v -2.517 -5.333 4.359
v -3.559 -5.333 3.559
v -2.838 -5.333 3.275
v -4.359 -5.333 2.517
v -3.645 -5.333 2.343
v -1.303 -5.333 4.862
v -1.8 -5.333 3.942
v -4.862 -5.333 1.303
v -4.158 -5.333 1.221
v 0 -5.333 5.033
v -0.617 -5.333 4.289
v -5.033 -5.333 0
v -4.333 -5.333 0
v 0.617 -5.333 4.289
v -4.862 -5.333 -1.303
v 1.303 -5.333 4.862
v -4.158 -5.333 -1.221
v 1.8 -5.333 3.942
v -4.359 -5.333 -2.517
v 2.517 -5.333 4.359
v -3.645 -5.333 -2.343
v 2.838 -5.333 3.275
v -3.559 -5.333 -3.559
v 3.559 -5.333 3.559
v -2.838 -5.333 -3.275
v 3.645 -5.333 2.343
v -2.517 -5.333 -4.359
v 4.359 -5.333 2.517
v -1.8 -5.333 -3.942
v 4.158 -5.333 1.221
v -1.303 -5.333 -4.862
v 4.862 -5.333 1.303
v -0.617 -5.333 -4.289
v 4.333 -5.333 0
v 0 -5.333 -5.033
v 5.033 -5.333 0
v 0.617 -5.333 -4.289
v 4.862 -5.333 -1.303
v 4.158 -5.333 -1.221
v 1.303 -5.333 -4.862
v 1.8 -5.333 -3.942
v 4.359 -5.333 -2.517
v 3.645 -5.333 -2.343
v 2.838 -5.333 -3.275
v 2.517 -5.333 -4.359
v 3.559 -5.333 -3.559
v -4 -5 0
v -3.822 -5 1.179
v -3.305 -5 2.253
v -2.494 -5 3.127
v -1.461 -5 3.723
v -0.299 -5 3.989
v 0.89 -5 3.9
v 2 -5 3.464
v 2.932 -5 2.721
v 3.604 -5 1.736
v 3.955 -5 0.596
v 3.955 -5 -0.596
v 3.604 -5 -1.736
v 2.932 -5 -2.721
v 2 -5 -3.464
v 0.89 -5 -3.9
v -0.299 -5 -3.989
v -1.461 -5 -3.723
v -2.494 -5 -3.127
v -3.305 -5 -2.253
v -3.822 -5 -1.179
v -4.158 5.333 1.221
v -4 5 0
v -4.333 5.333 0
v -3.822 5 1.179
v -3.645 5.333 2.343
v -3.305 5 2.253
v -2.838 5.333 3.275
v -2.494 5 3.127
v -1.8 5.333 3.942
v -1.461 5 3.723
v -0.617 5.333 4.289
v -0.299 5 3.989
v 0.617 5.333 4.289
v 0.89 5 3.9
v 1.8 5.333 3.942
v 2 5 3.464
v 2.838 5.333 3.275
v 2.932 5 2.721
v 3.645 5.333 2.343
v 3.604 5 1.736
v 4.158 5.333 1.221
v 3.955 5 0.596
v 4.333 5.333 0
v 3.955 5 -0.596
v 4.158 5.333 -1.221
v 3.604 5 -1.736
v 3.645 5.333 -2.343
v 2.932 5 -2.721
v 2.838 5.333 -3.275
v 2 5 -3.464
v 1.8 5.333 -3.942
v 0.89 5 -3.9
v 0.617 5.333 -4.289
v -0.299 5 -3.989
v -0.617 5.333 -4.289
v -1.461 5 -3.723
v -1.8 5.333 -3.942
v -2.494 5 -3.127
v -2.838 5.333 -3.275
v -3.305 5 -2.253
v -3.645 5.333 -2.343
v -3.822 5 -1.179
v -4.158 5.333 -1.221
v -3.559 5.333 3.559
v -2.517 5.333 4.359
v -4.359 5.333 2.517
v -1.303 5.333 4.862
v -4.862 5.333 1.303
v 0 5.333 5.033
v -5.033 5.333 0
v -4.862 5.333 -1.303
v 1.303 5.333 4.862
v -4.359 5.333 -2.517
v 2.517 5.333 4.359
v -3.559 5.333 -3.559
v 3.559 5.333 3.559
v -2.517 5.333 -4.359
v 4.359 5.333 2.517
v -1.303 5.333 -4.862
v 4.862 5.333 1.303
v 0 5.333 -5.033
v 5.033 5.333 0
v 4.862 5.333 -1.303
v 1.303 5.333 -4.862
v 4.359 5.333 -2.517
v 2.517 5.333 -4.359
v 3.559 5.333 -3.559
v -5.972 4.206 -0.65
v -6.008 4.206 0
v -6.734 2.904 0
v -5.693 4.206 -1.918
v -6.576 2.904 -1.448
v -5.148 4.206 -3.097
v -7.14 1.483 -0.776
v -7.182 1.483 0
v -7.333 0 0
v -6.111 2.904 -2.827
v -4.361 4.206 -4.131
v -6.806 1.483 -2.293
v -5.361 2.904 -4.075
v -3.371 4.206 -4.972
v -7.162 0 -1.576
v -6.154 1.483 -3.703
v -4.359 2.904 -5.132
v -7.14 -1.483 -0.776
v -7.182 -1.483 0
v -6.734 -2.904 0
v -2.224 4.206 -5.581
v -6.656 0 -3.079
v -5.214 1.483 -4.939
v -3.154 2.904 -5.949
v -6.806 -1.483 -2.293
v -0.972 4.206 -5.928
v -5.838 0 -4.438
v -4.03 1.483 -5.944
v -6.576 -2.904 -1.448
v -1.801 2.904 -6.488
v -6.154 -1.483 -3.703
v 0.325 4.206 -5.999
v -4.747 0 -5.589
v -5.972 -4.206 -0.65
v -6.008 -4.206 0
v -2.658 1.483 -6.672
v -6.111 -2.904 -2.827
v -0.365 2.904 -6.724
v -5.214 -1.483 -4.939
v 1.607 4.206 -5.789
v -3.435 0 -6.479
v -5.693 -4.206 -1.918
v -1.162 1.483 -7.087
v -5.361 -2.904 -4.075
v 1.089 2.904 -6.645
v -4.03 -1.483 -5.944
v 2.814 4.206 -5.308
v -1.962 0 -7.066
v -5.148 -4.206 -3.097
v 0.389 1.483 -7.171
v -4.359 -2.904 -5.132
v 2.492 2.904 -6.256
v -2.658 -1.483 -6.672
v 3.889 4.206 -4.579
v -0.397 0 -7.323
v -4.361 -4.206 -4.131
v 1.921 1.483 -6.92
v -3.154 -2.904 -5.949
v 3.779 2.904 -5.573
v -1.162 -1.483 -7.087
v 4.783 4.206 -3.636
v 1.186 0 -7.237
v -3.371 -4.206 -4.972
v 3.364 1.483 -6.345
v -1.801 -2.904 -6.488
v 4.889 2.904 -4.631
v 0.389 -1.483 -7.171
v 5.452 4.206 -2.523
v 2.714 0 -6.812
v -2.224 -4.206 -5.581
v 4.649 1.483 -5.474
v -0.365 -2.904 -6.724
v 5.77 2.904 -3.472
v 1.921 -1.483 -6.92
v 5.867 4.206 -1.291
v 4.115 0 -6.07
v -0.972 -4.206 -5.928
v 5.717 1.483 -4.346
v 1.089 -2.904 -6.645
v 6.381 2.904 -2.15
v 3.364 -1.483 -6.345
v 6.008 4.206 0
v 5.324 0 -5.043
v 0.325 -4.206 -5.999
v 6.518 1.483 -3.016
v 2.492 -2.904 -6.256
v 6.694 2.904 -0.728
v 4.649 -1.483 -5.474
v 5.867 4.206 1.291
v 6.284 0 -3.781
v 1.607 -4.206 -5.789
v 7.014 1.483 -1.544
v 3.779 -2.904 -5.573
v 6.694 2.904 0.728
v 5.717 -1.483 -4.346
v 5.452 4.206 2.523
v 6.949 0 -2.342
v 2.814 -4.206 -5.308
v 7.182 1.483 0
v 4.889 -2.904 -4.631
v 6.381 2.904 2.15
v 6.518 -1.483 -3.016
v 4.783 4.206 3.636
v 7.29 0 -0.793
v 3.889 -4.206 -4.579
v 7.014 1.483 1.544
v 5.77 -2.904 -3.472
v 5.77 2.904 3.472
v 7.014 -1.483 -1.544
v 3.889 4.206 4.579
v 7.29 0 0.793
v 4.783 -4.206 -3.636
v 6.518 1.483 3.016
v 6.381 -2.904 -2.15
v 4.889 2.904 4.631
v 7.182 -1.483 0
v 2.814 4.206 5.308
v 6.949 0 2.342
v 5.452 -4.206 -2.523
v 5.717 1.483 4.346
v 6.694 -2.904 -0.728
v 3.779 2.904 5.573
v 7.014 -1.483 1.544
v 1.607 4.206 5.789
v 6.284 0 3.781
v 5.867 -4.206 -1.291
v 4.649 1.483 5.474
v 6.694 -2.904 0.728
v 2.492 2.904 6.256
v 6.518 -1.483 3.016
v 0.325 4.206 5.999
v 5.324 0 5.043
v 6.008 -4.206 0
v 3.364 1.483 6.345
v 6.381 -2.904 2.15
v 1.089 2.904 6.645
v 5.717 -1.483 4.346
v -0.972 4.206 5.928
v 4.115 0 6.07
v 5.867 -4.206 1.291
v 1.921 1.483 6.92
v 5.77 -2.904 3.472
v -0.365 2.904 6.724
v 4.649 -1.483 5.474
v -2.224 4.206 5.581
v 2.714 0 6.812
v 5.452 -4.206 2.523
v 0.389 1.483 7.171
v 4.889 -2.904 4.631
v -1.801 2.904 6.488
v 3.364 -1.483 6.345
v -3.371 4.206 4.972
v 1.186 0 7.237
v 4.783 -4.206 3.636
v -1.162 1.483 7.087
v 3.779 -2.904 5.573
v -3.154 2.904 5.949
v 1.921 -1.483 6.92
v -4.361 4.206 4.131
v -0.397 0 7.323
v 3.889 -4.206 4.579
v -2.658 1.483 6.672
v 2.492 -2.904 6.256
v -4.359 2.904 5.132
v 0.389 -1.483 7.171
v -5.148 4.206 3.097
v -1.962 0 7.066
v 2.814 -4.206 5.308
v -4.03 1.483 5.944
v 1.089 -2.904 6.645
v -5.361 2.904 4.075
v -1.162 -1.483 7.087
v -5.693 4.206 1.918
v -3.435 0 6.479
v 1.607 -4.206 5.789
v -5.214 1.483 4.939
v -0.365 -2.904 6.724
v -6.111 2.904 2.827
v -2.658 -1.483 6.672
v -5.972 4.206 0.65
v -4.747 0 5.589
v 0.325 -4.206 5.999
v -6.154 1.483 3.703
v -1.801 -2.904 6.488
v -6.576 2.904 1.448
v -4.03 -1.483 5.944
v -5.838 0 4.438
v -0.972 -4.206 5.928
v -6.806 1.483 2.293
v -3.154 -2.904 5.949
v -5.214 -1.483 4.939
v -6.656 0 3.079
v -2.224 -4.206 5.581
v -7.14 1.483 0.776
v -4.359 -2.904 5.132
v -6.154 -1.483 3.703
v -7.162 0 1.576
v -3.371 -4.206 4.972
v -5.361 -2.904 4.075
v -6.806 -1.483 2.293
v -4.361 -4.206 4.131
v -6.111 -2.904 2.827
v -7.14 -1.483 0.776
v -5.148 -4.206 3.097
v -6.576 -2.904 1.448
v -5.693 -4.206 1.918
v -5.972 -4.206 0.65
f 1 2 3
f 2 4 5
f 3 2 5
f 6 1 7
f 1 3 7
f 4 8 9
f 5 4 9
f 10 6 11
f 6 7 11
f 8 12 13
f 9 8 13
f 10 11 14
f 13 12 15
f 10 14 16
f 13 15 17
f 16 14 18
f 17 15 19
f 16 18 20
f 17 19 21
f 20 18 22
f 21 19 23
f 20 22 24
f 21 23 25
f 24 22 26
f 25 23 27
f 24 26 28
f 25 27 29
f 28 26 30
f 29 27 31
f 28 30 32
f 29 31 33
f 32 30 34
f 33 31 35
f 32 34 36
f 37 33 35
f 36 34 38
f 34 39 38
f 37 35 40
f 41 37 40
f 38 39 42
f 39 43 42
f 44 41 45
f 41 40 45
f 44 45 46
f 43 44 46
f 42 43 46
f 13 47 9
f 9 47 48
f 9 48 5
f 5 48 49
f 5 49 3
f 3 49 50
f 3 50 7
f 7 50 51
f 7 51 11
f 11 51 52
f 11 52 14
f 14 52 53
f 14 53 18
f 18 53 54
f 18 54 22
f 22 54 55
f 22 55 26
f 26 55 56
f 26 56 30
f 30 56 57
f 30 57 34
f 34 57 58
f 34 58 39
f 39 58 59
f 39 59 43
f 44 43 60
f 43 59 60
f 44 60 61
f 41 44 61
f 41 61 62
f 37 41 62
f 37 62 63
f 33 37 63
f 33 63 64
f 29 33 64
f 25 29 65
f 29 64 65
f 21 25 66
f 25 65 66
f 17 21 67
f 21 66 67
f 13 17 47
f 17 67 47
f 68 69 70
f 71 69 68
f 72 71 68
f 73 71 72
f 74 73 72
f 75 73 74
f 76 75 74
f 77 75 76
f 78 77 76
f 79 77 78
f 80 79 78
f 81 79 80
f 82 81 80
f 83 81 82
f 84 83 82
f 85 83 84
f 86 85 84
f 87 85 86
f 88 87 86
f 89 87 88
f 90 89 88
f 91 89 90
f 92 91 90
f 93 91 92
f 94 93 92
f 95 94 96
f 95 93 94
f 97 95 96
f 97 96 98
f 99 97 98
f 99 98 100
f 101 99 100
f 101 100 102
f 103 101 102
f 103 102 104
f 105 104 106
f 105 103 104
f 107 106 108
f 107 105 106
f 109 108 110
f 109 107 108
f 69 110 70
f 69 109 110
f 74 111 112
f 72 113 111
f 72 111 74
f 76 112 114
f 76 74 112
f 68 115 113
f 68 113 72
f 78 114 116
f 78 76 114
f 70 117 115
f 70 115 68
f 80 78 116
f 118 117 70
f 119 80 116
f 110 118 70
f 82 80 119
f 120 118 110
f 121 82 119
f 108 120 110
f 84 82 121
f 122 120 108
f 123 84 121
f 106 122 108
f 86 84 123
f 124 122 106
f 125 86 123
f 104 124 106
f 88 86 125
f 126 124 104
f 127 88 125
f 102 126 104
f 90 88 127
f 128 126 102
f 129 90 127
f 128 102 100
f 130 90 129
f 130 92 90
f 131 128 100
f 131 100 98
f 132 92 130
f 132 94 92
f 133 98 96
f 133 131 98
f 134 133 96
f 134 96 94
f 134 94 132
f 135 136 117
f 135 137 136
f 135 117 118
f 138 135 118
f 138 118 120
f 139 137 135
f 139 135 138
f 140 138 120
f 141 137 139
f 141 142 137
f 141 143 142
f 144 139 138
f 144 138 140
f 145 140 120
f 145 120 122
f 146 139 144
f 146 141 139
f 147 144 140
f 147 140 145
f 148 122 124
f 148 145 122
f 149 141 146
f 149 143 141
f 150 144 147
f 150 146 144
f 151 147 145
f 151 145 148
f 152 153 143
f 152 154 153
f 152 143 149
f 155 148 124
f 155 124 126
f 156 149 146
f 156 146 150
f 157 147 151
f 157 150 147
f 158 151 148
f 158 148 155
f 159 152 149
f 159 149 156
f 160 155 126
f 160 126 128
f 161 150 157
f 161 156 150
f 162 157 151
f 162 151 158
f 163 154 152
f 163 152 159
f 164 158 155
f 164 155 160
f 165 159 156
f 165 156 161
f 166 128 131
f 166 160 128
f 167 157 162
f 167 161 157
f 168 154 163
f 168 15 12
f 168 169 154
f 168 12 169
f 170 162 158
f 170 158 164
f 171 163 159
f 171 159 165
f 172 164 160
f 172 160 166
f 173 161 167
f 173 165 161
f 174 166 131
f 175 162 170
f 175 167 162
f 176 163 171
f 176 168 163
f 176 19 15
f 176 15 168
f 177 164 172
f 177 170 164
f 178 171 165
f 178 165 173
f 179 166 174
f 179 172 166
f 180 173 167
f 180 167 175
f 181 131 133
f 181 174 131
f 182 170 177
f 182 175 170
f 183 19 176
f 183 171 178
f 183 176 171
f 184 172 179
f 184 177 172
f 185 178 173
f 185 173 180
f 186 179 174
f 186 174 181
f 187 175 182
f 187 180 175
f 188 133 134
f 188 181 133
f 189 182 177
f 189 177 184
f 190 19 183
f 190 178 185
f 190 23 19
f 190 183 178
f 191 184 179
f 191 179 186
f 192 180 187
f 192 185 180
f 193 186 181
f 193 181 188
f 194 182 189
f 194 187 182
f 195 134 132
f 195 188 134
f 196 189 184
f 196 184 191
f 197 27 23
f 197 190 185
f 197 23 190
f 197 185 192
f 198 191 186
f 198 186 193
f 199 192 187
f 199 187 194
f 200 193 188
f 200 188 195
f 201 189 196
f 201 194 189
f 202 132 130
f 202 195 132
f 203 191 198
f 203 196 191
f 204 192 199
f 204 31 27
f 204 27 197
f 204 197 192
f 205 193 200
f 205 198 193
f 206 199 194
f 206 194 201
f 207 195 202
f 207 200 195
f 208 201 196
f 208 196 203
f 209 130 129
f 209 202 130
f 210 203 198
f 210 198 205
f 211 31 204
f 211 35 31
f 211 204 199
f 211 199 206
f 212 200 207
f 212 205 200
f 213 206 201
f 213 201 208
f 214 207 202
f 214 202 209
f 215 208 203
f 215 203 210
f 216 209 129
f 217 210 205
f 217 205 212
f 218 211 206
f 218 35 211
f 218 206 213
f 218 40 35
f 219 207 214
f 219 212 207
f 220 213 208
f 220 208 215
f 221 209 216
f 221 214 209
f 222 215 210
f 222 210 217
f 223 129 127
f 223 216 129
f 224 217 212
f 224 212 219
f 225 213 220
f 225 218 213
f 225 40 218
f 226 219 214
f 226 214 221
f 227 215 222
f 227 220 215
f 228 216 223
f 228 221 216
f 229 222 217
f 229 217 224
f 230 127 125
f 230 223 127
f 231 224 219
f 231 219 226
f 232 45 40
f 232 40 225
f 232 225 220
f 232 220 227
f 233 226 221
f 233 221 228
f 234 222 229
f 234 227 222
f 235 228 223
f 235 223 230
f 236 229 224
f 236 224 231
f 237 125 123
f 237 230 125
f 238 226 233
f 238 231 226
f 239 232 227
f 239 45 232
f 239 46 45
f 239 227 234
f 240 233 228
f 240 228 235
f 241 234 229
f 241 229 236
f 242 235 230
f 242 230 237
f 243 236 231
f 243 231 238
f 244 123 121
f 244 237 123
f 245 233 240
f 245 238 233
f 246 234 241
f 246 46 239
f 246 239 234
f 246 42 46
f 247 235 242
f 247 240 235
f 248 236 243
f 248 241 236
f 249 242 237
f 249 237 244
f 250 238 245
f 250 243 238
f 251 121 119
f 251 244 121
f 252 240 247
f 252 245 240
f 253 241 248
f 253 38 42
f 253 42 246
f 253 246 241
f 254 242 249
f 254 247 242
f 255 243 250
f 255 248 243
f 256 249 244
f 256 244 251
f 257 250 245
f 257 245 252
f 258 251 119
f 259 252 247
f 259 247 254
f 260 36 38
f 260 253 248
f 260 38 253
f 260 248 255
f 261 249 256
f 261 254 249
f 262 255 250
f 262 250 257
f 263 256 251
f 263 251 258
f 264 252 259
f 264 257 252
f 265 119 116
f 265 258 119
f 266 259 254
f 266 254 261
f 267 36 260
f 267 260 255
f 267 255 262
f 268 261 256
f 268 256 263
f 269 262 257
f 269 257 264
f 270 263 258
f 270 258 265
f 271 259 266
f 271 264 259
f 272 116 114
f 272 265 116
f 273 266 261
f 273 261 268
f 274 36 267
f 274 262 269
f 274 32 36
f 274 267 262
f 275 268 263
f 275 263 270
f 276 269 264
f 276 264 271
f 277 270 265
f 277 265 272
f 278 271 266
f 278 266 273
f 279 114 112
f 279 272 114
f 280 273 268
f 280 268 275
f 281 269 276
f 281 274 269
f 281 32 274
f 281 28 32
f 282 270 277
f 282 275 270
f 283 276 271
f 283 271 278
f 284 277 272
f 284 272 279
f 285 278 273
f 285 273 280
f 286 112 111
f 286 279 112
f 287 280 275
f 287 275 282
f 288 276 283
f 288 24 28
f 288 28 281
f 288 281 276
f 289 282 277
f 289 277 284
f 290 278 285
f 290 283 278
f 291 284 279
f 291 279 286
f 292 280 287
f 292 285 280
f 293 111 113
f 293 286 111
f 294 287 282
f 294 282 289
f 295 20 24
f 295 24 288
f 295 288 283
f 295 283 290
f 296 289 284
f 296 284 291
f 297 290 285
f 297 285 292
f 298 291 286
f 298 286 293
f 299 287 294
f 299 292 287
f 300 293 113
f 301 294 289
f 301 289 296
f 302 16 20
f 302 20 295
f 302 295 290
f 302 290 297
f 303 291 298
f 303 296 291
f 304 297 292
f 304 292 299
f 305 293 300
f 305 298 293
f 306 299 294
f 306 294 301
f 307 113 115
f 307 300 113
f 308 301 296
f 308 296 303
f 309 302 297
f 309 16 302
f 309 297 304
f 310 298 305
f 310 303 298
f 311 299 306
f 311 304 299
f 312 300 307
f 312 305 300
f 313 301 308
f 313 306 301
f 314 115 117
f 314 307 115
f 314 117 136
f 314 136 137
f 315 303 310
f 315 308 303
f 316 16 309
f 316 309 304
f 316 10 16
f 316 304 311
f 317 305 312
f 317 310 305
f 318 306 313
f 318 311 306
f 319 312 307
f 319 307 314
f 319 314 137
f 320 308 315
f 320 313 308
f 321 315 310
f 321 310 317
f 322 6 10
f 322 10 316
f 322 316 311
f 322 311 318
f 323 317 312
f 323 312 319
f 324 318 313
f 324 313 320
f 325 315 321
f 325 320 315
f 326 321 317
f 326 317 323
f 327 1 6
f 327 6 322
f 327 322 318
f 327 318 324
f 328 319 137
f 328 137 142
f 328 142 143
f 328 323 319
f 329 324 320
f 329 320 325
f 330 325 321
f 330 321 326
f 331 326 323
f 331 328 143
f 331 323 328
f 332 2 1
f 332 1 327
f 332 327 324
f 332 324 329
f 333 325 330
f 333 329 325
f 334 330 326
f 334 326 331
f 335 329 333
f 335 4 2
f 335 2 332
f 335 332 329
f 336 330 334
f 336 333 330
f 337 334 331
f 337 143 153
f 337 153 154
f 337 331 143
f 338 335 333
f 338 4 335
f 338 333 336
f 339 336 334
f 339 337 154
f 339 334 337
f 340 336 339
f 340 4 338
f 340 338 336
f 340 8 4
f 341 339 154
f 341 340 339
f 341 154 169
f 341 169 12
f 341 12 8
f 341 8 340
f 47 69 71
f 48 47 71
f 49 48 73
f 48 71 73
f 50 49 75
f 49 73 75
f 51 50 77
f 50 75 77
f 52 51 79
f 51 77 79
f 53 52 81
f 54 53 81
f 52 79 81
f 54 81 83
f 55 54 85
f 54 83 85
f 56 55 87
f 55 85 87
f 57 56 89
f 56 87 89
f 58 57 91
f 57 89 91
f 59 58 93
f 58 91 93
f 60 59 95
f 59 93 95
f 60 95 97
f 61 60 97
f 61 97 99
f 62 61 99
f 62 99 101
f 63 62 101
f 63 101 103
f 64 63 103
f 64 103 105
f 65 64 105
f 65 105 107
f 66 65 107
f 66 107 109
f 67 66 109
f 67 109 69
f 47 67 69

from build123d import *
from build123d.topology import SkipClean

# Parameters (mm, degrees)
CUT_EXTRUDE1_START     = -7.549834435
CUT_EXTRUDE1_OUTLINE_W = 18
CUT_EXTRUDE1_OUTLINE_H = 4
CUT_EXTRUDE1_DEPTH     = 15.09966887
SKETCH3_R              = 6
CUT_EXTRUDE2_DEPTH     = 57
CHAMFER1_SIZE          = 0.5
SCALE1_SCALE           = 0.666666667


# Read off the part's stored shape, not the designer's step: Cut-Extrude1
with BuildPart() as part:
    # Sketch1 → Revolve1 (revolve)
    with SkipClean():  # the faces are left unmerged after this step: merging them gives an invalid solid
        with BuildSketch(Plane.XY):
            with BuildLine():
                ThreePointArc((11, 0), (7.778174593, 7.778174593), (0, 11))
                Line((0, 11), (0, -11))
                ThreePointArc((0, -11), (7.778174593, -7.778174593), (11, 0))
            make_face()
            with BuildLine():
                Line((0, -11), (0, 11))
                ThreePointArc((0, 11), (-11, 0), (0, -11))
            make_face()
        revolve(axis=Axis((0, 11, 0), (0, -1, 0)))

    # Cut-Extrude1 outline → Cut-Extrude1 (cut)
    with BuildSketch(Plane.XY.offset(CUT_EXTRUDE1_START)):
        with Locations((0, 10)):
            Rectangle(CUT_EXTRUDE1_OUTLINE_W, CUT_EXTRUDE1_OUTLINE_H)
        with Locations((0, -10)):
            Rectangle(CUT_EXTRUDE1_OUTLINE_W, CUT_EXTRUDE1_OUTLINE_H)
    extrude(amount=CUT_EXTRUDE1_DEPTH, mode=Mode.SUBTRACT)

    # Sketch3 → Cut-Extrude2 (cut)
    with BuildSketch(Plane(origin=(0, 8, 0), x_dir=(1, 0, 0), z_dir=(0, 1, 0))):
        with Locations(Location((0, 0, 0), (0, 0, 180))):
            Circle(SKETCH3_R)
    extrude(amount=-CUT_EXTRUDE2_DEPTH, mode=Mode.SUBTRACT)

    # Chamfer1
    chamfer1_edges = [part.edges().sort_by_distance(p)[0] for p in [
        (6, -8, 0),
        (6, 8, 0),
    ]]
    chamfer(chamfer1_edges, length=CHAMFER1_SIZE)


with BuildPart() as part_1:
    # Scale1: scaled about (0, 0, 0)
    add(part.part.scale(SCALE1_SCALE))


solid = part_1.part
